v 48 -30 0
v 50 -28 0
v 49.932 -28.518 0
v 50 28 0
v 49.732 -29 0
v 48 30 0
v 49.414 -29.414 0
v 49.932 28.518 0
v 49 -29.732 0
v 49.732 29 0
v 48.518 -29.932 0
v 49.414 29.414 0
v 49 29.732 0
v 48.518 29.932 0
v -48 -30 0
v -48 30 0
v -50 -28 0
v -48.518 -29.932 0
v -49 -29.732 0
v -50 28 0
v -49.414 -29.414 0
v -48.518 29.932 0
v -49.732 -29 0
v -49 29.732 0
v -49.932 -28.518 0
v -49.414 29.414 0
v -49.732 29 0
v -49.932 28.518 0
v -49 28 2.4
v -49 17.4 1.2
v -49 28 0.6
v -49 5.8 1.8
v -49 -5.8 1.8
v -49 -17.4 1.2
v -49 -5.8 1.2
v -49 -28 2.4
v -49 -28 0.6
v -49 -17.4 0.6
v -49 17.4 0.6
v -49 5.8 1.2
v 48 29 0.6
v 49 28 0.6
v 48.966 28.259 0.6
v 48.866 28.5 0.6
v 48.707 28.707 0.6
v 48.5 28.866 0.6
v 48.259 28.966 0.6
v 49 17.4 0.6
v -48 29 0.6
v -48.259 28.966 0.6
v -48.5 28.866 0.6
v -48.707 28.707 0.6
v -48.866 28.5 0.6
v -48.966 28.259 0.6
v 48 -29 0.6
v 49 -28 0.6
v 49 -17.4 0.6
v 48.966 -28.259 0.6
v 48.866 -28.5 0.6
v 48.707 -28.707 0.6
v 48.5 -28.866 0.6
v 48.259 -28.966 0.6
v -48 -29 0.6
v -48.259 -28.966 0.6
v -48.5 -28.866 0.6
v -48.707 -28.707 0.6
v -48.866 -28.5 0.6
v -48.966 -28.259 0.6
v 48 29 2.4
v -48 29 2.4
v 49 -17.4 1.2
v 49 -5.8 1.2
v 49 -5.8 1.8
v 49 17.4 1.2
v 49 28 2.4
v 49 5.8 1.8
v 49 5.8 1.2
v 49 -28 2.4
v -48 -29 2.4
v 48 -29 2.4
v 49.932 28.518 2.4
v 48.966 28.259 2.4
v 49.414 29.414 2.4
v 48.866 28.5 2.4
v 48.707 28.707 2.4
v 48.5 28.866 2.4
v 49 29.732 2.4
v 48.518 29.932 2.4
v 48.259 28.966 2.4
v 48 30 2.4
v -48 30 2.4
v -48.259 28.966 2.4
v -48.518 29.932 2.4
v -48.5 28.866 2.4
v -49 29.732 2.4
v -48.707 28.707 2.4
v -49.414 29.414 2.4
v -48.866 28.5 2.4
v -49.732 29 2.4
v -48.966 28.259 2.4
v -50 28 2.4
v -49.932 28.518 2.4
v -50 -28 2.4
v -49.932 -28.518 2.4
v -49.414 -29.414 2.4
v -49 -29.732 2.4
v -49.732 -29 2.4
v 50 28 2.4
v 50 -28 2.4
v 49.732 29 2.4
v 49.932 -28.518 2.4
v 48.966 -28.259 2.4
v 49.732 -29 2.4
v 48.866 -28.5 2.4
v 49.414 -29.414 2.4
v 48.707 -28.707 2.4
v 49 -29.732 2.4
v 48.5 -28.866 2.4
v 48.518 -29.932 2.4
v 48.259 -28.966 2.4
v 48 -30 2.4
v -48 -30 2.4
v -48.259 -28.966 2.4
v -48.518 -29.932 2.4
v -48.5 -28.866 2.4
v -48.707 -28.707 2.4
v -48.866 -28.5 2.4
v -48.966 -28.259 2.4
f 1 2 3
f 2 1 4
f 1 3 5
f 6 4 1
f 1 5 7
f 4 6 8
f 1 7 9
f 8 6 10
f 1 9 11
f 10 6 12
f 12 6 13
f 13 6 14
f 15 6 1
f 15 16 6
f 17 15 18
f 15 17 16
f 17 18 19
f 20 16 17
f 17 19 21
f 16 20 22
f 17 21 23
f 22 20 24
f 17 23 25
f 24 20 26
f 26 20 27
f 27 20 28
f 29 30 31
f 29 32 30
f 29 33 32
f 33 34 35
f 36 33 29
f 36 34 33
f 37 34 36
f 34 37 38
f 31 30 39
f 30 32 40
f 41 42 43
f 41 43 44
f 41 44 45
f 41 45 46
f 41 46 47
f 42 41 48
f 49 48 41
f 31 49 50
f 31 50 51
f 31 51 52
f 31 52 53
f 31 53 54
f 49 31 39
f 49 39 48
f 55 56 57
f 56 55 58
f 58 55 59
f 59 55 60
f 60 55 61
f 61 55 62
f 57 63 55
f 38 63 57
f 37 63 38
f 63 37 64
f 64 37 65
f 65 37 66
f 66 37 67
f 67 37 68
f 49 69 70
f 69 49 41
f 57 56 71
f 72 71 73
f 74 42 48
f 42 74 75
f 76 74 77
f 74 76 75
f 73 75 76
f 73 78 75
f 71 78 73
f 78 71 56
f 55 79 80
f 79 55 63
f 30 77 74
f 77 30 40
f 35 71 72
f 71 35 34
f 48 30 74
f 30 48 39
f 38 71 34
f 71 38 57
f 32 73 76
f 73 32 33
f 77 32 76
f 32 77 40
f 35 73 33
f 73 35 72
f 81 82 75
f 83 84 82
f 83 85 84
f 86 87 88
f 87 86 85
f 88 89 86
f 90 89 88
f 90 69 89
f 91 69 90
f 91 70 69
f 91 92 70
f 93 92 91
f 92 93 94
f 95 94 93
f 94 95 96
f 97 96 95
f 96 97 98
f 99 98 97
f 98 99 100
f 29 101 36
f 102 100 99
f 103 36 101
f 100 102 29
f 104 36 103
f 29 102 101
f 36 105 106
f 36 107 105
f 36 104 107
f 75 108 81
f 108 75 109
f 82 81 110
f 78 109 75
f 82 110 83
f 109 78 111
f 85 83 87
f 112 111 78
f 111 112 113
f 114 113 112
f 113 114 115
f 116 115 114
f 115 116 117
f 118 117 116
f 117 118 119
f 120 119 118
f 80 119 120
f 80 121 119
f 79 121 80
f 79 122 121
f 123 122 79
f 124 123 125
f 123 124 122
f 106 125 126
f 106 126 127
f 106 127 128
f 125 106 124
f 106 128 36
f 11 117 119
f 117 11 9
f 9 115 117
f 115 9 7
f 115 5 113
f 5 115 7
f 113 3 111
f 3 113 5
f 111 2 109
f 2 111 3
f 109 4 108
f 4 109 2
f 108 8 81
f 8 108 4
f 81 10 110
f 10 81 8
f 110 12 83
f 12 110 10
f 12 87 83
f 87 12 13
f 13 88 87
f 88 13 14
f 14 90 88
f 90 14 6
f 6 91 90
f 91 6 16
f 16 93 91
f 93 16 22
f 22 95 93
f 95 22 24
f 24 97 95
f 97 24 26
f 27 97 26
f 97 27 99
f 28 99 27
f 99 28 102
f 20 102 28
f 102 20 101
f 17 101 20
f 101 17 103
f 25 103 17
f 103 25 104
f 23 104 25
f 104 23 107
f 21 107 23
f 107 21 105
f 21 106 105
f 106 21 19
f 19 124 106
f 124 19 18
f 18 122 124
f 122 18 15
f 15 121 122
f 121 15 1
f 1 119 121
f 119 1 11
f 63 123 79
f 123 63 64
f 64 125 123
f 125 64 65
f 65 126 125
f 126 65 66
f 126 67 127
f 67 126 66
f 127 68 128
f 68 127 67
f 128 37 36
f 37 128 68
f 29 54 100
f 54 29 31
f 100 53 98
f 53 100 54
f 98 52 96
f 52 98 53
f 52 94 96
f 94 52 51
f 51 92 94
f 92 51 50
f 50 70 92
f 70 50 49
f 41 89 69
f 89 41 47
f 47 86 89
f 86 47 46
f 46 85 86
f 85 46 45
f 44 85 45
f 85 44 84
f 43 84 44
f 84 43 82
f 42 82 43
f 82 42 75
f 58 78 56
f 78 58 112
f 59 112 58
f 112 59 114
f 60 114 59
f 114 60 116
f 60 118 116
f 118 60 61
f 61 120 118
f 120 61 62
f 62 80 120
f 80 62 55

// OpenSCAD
aspect = 3/5;

x = 100;
y = x * aspect;

z1 = 0.6;
z2 = 1.2;
z3 = 1.8;
z4 = 2.4;

rim = 1;

module rim() {
    $fn = 24;

    difference() {
        offset(rim * 2)
        offset(-rim * 2)
        square([x, y], center = true);

        offset(rim)
        offset(-rim)
        square([x - rim * 2, y - rim * 2], center = true);
    }
}

module flag() {
    color("#5BCEFA")
    linear_extrude(z1)
    square([x - rim * 2, y - rim * 2], center = true);

    color("#F5A9B8")
    linear_extrude(z2)
    square([x - rim * 2, (y - rim * 2) * 3/5], center = true);

    color("#FFFFFF")
    linear_extrude(z3)
    square([x - rim * 2, (y - rim * 2) / 5], center = true);

    color("#444444")
    linear_extrude(z4)
    rim();
}

flag();
